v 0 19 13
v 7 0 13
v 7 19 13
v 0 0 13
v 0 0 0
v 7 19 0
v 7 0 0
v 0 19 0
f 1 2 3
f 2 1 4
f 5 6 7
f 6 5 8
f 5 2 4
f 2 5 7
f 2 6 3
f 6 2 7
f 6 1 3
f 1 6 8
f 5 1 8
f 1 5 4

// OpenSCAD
// Generated by SolidPython 1.0.1 on 2020-07-29 00:46:55


cube(size = [7, 19, 13]);
/***********************************************
*********      SolidPython code:      **********
************************************************
 
# import packages: SolidPython
from solid import *
from solid.utils import *
from itertools import chain, combinations, permutations


class Resize:

    def __init__(self, scad_file):
        self.scad_file = scad_file
        #self.scad_file = import_scad(scad_file)
        # cone/cylinder param:
        self.r1 = 0
        self.r2 = 0
        self.h = 0
        # rectangular prism param:
        self.w = 0
        self.l = 0
        # ellipse param:
        self.r = 0

    # import OpenScad code (file name corresponds to shape)


    # classify shape + parameters
    def assign(self, param1, param2, param3):
        if self.scad_file == 'cone.scad':
            self.r1 = param1
            self.r2 = param2
            self.h = param3
        elif self.scad_file == 'cylinder.scad':
            self.r1 = param1
            self.r2 = param2
            self.h = param3
        elif self.scad_file == 'rectangularPrism.scad':
            self.h = param1
            self.l = param2
            self.w = param3
        else:
            self.r = param1
            self.h = param2

    # resize parameters
    def iterate(self):
        x = range(3, 20, 2)
        i = 1
        if self.scad_file == 'cone.scad':
            tempList = list(permutations(x, 2))
            for temp in tempList:
                param1 = temp[0]
                param2 = temp[1]
                filepath = 'produced_scad_files/' + 'cone' + str(param1) + '_' + str(param2) + '_' + '.scad'
                scad_render_to_file(cylinder(h=param1, r1=param2, r2=0), filepath)

        elif self.scad_file == 'cylinder.scad':
            tempList = list(permutations(x, 3))
            for temp in tempList:
                param1 = temp[0]
                param2 = temp[1]
                filepath = 'produced_scad_files/' + 'cylinder' + str(param1) + '_' + str(param2) + '_' + '.scad'
                scad_render_to_file(cylinder(h=param1, r1=param2, r2=param2), filepath)

        elif self.scad_file == 'rectangularPrism.scad':
            tempList = list(permutations(x, 3))
            for temp in tempList:
                param1 = temp[0]
                param2 = temp[1]
                param3 = temp[2]
                filepath = 'produced_scad_files/' + 'rectangularPrism' + str(param1) + '_' + str(param2) + '_' + str(
                    param3) + '.scad'
                scad_render_to_file(cube(size=(param1, param2, param3)), filepath)

        elif self.scad_file == 'ellipse.scad':
            tempList = list(permutations(x, 4))
            for temp in tempList:
                param1 = temp[0]
                param2 = temp[1]
                param3 = temp[2]
                param4 = temp[3]
                filepath = 'produced_scad_files/' + 'ellipse' + str(param1) + '_' + str(param2) + '_' + str(param3) + '_' + str(param4) + '.scad'
                scad_render_to_file(scale([param1, param2, param3])(sphere(r=param4)), filepath)

    def render_to_scadfile(self):
        scad_render_to_file(scad, 'example.scad') 
 
************************************************/
